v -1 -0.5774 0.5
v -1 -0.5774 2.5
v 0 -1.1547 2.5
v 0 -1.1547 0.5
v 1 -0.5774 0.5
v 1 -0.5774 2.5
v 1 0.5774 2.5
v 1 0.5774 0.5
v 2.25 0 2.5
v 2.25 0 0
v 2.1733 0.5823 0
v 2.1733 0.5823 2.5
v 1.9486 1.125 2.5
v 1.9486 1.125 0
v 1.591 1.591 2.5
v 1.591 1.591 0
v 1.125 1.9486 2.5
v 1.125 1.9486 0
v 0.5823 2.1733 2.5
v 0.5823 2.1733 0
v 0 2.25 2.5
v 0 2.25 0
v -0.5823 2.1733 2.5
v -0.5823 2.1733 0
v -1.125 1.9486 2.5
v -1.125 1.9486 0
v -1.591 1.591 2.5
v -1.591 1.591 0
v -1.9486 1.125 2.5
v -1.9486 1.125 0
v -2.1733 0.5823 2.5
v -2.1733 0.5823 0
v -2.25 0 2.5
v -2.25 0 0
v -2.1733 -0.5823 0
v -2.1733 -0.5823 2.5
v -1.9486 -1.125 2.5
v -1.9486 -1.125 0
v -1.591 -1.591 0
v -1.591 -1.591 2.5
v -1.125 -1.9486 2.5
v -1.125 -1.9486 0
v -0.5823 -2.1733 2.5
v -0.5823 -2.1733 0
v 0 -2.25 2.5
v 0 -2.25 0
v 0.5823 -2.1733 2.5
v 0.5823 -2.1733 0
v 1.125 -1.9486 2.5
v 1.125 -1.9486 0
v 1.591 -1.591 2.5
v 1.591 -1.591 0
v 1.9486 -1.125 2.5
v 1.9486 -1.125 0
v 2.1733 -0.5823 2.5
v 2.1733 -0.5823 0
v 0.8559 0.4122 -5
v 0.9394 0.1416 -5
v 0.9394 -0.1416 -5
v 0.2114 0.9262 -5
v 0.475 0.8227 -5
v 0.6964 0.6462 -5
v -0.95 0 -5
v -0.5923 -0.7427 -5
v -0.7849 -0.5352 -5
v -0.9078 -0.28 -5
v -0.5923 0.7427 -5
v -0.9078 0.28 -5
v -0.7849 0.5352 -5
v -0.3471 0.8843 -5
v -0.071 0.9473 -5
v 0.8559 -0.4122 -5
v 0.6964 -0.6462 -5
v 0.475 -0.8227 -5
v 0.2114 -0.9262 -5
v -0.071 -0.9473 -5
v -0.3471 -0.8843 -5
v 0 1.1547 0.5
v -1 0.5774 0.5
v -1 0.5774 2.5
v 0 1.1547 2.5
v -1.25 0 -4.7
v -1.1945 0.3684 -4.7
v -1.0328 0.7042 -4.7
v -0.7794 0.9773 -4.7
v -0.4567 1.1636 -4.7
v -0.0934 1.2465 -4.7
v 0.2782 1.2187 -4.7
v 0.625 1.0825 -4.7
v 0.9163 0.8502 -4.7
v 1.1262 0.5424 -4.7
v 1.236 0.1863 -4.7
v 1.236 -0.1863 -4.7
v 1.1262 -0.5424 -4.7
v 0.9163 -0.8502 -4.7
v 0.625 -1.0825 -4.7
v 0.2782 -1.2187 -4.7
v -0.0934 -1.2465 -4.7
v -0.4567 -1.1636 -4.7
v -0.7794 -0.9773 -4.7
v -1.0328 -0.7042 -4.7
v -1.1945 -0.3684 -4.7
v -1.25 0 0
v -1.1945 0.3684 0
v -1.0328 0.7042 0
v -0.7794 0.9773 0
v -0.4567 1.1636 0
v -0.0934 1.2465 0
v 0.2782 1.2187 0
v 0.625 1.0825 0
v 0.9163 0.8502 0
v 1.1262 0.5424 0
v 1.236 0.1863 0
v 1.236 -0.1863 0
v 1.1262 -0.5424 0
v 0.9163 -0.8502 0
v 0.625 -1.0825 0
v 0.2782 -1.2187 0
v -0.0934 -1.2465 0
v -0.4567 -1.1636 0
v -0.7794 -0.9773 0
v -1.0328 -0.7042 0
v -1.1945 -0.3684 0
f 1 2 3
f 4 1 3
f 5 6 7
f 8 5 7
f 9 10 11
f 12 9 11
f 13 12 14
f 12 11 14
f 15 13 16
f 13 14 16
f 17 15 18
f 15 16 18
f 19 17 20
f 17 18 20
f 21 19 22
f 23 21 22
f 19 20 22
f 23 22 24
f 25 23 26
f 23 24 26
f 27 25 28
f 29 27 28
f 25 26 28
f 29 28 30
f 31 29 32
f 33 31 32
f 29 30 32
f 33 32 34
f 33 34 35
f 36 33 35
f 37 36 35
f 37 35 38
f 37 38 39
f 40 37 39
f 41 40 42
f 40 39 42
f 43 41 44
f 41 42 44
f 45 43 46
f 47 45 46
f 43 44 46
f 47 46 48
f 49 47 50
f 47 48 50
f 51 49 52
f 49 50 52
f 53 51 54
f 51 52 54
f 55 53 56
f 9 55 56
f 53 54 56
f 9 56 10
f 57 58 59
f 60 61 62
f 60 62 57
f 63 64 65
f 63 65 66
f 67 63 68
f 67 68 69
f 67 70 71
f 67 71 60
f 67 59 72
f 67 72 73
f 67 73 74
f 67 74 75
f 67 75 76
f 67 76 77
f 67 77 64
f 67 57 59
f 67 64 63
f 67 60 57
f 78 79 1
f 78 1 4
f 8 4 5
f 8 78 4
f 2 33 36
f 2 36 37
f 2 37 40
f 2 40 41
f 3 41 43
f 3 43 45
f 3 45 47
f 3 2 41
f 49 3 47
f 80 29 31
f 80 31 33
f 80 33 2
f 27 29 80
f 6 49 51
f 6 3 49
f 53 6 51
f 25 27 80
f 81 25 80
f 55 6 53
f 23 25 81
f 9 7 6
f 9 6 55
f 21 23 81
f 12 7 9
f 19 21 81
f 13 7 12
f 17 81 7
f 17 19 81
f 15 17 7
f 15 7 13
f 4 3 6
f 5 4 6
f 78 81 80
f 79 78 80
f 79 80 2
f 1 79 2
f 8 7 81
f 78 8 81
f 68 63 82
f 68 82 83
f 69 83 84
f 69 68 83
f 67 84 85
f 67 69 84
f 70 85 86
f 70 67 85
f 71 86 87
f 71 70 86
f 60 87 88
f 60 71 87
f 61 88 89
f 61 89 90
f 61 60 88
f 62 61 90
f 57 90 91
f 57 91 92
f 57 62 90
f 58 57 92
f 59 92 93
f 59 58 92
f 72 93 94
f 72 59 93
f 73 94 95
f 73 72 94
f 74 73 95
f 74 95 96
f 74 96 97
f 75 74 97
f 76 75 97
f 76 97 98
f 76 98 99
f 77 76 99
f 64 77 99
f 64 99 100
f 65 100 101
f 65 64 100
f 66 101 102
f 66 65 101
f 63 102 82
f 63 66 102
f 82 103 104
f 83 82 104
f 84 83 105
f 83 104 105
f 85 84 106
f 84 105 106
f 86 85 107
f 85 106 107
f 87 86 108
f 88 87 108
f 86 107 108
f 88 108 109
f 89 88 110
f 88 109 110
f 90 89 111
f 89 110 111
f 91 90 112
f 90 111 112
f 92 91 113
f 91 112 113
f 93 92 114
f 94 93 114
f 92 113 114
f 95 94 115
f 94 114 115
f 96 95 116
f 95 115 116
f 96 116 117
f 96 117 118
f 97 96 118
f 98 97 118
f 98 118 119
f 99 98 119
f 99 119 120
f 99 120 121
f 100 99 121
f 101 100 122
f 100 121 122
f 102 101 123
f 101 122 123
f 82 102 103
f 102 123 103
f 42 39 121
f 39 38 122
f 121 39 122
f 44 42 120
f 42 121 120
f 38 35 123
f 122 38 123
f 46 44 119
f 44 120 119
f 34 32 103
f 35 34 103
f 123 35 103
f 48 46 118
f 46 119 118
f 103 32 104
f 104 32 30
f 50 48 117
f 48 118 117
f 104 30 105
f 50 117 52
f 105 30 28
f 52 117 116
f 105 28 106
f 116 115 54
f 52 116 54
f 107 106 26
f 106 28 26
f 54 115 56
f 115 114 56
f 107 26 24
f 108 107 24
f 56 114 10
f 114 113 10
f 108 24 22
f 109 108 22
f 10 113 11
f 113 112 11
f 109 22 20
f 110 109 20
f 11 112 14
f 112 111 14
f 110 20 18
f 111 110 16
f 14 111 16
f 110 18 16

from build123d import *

# Parameters (mm, degrees)
SKETCH1_R           = 2.25
BOSS_EXTRUDE1_DEPTH = 2.5
SKETCH2_R           = 1.25
BOSS_EXTRUDE2_DEPTH = 5
CHAMFER1_SIZE       = 0.3
CUT_EXTRUDE1_DEPTH  = 2


with BuildPart() as part:
    # Sketch1 → Boss-Extrude1 (new body)
    with BuildSketch(Plane.XY):
        Circle(SKETCH1_R)
    extrude(amount=BOSS_EXTRUDE1_DEPTH)

    # Sketch2 → Boss-Extrude2 (add)
    with BuildSketch(Plane(origin=(0, 0, 0), x_dir=(-1, 0, 0), z_dir=(0, 0, -1))):
        Circle(SKETCH2_R)
    extrude(amount=BOSS_EXTRUDE2_DEPTH)

    # Chamfer1
    chamfer1_edges = [part.edges().sort_by_distance(p)[0] for p in [
        (1.25, 0, -5),
    ]]
    chamfer(chamfer1_edges, length=CHAMFER1_SIZE)

    # Sketch3 → Cut-Extrude1 (cut)
    with BuildSketch(Plane.XY.offset(2.5)):
        Polygon((0, 1.154700538), (-1, 0.577350269), (-1, -0.577350269), (0, -1.154700538), (1, -0.577350269), (1, 0.577350269), align=None)
    extrude(amount=-CUT_EXTRUDE1_DEPTH, mode=Mode.SUBTRACT)


solid = part.part
